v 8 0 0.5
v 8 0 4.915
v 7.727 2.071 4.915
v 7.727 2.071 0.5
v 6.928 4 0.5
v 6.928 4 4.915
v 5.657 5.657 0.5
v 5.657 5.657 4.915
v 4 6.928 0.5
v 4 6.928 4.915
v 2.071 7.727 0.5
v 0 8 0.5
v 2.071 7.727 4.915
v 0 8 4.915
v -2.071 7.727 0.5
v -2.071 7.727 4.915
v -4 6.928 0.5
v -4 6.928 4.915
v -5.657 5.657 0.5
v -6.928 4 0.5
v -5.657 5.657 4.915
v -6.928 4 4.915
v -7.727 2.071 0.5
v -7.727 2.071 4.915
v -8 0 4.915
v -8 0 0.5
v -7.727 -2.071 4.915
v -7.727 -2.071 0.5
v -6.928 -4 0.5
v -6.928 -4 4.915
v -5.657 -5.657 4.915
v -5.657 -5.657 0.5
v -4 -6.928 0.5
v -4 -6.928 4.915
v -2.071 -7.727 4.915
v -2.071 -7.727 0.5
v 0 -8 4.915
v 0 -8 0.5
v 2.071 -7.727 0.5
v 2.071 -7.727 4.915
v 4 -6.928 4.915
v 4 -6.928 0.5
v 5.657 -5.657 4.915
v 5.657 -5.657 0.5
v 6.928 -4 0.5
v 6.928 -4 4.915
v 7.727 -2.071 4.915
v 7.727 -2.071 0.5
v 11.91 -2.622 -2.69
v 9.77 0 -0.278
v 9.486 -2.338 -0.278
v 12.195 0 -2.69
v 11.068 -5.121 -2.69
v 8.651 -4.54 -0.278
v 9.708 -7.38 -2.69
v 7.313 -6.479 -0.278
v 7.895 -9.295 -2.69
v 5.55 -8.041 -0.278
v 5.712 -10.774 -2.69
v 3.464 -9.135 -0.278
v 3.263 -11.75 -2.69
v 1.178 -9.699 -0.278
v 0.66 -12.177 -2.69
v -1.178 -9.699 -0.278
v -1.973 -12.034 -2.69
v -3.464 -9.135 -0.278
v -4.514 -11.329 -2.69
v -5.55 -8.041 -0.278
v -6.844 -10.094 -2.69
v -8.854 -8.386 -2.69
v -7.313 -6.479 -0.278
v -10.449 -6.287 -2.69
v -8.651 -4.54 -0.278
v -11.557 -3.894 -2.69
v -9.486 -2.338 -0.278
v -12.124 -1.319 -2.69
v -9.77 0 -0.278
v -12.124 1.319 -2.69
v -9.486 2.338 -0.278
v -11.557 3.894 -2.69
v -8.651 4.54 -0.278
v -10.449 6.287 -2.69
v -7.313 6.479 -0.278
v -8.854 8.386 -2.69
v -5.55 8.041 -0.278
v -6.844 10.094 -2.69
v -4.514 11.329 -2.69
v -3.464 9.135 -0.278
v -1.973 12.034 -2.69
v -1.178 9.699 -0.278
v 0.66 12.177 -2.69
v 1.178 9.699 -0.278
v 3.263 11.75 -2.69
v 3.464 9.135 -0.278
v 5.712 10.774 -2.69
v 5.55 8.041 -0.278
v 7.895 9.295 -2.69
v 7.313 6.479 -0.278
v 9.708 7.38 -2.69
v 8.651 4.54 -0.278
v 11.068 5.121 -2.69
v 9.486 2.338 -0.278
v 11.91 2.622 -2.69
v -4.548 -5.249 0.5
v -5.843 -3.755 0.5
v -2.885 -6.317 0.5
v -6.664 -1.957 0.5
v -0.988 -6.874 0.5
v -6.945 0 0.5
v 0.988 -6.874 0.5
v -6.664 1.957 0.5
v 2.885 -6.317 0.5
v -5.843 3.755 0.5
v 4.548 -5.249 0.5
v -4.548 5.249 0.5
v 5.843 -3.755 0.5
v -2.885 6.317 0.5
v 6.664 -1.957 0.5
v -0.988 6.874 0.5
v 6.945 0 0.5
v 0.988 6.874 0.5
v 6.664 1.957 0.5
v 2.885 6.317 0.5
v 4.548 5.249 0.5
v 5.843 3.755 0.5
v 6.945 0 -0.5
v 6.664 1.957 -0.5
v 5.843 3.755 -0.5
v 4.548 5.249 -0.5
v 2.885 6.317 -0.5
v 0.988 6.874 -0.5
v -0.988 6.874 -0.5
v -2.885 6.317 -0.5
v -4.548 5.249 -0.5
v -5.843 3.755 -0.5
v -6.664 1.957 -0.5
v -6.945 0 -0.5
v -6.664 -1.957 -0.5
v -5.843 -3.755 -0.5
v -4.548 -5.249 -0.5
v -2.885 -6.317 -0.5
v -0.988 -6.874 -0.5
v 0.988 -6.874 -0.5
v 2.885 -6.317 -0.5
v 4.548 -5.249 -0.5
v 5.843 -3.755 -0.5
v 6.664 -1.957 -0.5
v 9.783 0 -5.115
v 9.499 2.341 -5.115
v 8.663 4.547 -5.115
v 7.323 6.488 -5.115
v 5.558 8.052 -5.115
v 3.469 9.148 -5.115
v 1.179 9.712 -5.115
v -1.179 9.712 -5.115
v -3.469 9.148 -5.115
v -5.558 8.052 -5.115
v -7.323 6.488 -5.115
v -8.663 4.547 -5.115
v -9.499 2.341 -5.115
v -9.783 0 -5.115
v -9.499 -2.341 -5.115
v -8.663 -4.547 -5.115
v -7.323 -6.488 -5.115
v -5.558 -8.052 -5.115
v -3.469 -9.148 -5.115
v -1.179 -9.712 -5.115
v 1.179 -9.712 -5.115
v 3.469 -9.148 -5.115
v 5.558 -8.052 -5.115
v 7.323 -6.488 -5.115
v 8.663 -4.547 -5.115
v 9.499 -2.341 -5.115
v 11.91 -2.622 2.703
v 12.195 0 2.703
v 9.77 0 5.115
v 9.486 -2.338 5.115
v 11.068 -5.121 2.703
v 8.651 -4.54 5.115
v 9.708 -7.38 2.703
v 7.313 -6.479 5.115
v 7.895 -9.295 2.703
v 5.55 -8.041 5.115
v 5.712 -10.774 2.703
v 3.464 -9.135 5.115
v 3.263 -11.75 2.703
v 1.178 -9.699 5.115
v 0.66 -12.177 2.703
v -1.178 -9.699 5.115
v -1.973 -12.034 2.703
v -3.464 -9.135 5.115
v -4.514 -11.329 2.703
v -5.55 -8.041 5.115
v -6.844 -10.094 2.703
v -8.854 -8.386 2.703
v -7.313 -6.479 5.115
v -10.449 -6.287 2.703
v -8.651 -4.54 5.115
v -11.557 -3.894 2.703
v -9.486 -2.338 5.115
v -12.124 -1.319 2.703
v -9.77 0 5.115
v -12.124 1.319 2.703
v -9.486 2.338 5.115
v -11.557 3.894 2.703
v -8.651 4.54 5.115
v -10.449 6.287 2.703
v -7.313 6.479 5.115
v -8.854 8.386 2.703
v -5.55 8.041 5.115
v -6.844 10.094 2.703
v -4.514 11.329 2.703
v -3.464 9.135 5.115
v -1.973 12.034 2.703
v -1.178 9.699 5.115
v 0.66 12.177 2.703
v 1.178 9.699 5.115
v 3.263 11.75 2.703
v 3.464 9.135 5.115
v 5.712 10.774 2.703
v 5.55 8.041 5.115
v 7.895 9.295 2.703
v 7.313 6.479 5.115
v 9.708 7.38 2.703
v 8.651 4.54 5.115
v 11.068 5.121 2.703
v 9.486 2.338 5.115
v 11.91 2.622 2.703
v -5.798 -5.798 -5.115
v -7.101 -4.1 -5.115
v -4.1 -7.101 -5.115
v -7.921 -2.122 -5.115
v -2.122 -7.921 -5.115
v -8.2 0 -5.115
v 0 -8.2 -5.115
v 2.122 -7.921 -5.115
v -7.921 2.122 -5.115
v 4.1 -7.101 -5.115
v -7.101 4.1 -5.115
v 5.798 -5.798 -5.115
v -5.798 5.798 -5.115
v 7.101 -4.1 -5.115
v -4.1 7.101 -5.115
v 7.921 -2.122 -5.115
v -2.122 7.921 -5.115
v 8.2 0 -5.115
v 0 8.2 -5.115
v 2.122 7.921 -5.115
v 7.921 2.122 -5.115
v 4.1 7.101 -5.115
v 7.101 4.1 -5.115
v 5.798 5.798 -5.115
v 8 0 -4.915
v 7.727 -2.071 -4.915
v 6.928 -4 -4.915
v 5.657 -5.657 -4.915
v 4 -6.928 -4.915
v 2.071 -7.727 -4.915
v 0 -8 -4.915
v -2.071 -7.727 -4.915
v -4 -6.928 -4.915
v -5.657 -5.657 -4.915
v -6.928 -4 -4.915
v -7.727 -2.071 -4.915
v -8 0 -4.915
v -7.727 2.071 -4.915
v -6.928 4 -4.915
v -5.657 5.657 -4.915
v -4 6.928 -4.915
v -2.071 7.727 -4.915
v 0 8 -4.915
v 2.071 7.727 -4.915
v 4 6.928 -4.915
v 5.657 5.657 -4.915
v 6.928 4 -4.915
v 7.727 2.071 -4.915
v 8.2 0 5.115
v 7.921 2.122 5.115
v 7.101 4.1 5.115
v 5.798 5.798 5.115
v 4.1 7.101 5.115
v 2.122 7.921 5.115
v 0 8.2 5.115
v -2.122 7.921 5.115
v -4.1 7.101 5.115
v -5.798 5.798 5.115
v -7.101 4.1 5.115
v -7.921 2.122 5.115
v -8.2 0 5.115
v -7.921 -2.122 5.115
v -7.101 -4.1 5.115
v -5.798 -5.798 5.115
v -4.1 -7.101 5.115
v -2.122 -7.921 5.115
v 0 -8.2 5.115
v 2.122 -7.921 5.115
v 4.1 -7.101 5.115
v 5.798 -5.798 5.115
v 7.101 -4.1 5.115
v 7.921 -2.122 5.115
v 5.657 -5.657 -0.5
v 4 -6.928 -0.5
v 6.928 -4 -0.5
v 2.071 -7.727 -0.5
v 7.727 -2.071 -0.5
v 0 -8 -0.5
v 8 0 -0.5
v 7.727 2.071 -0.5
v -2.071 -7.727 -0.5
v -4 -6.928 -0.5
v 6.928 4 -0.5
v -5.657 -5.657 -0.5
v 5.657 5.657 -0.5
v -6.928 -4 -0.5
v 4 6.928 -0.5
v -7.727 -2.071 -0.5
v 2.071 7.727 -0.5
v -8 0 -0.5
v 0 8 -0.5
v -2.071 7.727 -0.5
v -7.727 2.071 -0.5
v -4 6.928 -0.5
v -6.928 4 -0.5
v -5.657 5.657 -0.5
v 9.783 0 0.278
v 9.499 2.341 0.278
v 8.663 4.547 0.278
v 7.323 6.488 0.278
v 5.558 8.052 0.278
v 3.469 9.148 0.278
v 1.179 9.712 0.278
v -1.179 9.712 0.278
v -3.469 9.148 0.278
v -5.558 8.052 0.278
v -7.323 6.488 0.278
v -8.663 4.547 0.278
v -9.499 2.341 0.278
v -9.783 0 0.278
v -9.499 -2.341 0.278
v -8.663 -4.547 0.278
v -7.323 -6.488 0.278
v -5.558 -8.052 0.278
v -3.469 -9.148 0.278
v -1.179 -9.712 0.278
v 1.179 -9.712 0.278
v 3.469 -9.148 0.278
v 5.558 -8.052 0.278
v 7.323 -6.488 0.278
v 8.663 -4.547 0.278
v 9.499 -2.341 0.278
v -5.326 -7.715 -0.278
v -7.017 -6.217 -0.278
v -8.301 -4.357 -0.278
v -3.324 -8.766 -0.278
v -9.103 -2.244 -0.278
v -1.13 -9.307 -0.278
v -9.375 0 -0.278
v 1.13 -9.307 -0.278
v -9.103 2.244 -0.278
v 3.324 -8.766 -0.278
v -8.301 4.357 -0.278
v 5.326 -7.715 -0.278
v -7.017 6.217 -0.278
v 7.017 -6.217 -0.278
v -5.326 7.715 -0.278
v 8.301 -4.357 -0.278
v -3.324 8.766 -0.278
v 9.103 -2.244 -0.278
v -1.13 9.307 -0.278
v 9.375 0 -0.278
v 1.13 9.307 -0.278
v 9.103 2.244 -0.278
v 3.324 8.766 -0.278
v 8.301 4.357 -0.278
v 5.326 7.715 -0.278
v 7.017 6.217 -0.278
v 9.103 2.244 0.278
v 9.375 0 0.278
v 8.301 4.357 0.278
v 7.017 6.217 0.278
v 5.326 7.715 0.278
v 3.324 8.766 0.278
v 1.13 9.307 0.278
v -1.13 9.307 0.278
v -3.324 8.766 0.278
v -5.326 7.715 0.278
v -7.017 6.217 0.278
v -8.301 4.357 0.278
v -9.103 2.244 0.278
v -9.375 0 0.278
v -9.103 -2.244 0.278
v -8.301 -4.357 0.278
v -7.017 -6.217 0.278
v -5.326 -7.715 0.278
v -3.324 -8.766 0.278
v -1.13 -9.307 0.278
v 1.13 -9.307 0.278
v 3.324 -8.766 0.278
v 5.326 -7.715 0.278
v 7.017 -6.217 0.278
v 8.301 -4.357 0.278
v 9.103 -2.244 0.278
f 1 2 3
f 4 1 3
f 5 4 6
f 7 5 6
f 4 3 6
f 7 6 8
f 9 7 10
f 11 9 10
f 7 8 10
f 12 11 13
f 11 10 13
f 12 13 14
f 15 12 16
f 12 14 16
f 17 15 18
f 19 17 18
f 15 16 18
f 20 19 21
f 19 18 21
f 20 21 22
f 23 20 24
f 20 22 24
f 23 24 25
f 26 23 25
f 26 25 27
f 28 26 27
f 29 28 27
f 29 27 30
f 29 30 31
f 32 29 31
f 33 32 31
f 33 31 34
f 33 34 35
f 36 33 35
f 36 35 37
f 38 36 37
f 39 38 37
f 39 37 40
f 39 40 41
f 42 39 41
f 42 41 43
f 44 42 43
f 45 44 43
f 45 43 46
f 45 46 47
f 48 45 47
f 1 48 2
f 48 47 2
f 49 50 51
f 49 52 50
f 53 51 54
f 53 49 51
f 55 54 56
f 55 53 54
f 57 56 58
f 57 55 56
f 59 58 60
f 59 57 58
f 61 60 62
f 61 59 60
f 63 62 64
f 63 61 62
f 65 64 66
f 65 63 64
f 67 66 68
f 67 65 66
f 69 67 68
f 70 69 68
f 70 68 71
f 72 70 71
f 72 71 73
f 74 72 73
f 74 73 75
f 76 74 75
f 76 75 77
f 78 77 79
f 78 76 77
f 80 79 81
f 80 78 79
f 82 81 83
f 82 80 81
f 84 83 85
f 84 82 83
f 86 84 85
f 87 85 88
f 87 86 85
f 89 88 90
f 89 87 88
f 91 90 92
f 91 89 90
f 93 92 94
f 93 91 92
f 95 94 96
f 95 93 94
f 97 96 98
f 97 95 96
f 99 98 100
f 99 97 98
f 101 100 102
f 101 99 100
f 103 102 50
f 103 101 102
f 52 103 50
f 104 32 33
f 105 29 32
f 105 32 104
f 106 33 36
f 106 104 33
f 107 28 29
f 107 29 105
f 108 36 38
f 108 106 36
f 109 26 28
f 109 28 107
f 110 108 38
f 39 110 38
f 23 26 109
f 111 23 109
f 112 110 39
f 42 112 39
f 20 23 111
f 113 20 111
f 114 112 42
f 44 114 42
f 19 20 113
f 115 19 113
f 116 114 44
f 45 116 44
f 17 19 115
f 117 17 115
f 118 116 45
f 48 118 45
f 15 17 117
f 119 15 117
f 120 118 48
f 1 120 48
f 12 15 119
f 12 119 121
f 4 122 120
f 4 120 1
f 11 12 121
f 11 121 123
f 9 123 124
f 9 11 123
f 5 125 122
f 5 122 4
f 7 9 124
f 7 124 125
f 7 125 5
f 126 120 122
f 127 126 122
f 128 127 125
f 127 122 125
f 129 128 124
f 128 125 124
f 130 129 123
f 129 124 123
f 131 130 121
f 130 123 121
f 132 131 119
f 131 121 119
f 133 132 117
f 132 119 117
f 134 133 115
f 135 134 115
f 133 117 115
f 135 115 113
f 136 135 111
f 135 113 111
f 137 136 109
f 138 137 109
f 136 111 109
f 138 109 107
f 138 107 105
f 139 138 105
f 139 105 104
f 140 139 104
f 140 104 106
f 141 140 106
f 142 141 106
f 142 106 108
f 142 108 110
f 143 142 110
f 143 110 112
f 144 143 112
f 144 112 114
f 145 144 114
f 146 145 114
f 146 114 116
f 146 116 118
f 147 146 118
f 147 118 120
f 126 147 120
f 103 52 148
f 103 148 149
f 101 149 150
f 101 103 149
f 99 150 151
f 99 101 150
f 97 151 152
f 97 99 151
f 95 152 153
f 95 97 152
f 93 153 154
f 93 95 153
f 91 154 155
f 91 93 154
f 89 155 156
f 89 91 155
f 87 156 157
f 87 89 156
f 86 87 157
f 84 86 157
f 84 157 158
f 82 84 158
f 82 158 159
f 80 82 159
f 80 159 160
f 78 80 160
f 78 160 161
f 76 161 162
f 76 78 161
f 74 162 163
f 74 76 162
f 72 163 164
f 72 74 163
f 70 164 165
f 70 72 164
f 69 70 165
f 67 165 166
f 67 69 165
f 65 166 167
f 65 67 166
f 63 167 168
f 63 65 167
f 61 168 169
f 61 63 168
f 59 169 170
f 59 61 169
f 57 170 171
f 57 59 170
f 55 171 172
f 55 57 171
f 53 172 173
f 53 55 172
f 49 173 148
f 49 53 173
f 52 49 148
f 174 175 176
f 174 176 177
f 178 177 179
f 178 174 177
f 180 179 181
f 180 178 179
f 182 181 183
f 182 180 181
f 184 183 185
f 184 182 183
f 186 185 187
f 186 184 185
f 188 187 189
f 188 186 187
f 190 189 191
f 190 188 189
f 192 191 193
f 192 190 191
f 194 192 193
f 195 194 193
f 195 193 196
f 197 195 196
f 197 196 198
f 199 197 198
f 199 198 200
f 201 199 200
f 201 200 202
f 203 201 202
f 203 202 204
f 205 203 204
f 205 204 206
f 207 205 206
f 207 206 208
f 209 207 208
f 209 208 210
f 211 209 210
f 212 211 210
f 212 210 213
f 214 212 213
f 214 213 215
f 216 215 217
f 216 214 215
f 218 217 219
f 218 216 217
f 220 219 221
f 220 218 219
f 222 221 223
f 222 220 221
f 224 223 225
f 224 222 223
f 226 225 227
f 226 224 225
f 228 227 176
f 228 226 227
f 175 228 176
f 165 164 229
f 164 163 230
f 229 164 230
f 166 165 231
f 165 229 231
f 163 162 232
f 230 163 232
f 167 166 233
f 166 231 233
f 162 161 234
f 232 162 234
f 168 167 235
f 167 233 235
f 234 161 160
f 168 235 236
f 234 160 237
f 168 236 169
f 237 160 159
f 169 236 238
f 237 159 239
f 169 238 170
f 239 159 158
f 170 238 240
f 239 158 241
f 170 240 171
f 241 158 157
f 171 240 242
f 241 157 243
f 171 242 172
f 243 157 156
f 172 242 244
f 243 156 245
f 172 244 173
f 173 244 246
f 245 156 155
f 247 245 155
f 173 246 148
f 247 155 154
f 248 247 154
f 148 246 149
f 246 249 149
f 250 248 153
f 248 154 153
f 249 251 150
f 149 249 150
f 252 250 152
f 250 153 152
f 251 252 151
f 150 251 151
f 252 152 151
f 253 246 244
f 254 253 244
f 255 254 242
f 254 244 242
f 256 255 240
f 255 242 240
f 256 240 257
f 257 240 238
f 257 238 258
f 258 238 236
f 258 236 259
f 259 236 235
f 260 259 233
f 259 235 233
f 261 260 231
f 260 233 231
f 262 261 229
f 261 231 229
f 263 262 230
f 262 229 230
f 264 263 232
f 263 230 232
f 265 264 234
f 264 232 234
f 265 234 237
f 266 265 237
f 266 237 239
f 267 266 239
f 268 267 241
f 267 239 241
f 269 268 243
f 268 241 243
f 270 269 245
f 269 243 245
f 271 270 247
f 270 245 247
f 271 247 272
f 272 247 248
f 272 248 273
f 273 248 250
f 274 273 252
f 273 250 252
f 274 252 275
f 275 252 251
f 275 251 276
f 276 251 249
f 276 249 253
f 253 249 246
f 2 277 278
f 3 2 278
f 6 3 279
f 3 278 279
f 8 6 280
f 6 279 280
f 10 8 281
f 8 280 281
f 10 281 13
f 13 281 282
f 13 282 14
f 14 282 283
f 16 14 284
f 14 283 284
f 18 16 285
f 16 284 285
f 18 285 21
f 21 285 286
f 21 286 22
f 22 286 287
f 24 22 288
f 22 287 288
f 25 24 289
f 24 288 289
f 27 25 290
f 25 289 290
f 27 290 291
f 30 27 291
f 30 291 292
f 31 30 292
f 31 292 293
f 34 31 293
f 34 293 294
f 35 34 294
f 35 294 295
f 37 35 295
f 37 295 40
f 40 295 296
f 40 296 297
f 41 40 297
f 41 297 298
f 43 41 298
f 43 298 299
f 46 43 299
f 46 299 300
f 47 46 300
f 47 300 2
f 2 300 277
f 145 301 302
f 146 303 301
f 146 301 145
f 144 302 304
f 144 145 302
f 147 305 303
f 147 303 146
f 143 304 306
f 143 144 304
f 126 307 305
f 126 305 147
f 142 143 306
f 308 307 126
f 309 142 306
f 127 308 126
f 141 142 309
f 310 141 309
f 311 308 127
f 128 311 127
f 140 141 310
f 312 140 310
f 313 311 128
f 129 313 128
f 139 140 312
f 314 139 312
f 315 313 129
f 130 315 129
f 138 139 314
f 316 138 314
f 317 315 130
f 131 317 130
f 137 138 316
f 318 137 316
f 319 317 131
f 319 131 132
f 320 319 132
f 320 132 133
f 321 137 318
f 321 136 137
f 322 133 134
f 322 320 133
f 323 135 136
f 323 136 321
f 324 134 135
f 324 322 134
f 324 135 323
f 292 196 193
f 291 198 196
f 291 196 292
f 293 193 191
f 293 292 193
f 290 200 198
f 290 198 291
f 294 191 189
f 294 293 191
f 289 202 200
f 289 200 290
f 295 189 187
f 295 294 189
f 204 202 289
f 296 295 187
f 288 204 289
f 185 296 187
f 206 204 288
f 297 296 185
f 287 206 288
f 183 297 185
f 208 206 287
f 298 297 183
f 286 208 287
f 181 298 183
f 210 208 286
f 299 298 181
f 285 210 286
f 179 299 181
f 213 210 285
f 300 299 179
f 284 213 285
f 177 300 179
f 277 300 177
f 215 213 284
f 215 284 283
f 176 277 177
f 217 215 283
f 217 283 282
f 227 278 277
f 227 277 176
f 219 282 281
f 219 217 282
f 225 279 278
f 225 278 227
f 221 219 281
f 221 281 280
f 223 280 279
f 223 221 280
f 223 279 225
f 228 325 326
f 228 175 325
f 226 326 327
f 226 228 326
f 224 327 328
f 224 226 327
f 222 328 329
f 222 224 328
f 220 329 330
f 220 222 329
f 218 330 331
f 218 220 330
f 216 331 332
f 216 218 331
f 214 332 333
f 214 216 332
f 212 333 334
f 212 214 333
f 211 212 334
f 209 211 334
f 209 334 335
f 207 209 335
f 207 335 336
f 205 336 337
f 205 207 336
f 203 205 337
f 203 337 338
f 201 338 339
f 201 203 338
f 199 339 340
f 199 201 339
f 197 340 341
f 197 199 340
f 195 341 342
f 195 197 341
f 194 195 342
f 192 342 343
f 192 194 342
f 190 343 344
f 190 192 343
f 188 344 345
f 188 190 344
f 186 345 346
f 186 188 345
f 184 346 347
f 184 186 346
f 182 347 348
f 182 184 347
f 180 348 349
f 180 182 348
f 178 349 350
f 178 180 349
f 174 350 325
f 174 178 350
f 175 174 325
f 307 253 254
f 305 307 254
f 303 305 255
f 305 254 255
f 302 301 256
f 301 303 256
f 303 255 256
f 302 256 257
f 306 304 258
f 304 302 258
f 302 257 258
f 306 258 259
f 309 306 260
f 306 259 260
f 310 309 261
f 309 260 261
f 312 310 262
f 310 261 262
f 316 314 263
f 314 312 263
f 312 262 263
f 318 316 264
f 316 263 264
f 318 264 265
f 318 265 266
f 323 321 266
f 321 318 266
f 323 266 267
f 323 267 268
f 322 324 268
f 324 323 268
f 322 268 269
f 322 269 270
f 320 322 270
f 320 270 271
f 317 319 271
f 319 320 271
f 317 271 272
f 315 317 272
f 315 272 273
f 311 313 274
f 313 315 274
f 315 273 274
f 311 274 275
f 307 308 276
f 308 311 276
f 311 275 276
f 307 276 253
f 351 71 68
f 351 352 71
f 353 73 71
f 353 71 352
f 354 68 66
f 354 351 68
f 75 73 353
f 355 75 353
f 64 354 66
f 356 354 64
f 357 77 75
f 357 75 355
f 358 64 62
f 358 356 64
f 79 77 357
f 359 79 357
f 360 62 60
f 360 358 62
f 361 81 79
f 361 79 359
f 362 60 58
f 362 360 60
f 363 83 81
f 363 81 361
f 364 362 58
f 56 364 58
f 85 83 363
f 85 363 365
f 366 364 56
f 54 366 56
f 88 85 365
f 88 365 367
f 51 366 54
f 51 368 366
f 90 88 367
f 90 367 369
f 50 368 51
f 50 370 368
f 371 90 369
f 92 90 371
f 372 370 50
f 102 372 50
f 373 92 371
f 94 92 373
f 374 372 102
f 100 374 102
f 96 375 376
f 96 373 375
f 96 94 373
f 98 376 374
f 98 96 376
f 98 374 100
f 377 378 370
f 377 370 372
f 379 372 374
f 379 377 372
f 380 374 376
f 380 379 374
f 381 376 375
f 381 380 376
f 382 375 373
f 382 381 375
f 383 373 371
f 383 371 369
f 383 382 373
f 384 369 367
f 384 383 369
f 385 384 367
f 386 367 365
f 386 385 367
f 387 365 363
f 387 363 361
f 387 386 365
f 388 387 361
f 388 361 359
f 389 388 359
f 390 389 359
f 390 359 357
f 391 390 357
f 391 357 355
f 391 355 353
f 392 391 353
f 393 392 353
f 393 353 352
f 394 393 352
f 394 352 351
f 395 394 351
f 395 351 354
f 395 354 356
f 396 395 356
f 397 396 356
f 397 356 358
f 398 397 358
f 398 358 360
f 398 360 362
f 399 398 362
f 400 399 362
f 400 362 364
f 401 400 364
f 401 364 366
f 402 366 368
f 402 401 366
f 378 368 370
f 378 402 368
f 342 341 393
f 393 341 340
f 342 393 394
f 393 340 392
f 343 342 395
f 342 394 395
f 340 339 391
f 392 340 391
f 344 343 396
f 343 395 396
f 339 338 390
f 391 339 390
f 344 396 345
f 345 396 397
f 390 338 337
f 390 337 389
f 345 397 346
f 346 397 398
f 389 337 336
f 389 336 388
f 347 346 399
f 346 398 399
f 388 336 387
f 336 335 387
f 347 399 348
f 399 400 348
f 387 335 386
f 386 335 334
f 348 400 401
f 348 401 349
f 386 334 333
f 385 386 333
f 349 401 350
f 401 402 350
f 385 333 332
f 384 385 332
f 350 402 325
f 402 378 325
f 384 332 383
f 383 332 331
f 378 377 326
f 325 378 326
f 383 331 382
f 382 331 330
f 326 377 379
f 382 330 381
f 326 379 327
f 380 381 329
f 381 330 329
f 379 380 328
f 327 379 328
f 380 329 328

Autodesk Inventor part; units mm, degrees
ref_plane "YZ Plane" through (0, 0, 0) normal (1, 0, 0) x (0, 1, 0)
ref_plane "XZ Plane" through (0, 0, 0) normal (0, 1, 0) x (-1, 0, 0)
ref_plane "XY Plane" through (0, 0, 0) normal (0, 0, 1) x (1, 0, 0)
sketch "Skizze1" plane through (0, 0, 0) normal (0, 0, 1) x (1, 0, 0)
  line L0 (-17.073, 0) -> (17.073, 0) projected
  line L1 (0, -17.073) -> (0, 17.073) projected
  circle A0 centre (0, 0) radius 12.195
  dimension "d0" = 24.39
extrude "Extrusion1" add sketch "Skizze1" along normal mid plane 10.23
sketch "Skizze2" plane through (0, 0, 5.115) normal (0, 0, 1) x (1, 0, 0)
  circle A0 centre (0, 0) radius 12.195 projected
  circle A1 centre (0, 0) radius 8
  dimension "d3" = 16
extrude "Extrusion2" cut sketch "Skizze2" against normal blind 4.615 contours A1
chamfer "Fase1" distance 0.2 angle 45 1 edges at (-8, 0, 5.115)
mirror "Spiegeln1" about plane through (0, 0, 0) normal (0, 0, 1) of "Extrusion2"
chamfer "Fase2" distance 0.2 angle 45 1 edges at (-8, 0, -5.115)
sketch "Skizze3" plane through (0, 0, 0.5) normal (0, 0, 1) x (1, 0, 0)
  circle A0 centre (0, 0) radius 8 projected
  circle A1 centre (0, 0) radius 6.945
  dimension "d12" = 13.89
extrude "Extrusion3" cut sketch "Skizze3" against normal blind 1 contours A1
sketch "Skizze4" plane through (0, 0, 0) normal (0, 1, 0) x (-1, 0, 0)
  line L0 (17.073, 0) -> (-17.073, 0) projected
  line L1 (0, -7.161) -> (0, 7.161) projected
  line L2 (-12.195, -5.115) -> (12.195, -5.115) projected
  line L3 (12.195, 5.115) -> (-12.195, 5.115) projected
  line L4 (-12.195, -5.115) -> (-12.195, 5.115) projected
  line L5 (-12.195, -5.115) -> (12.195, -5.115) projected
  line L6 (-9.7834, -5.115) -> (-12.195, -2.69)
  line L7 (-12.195, -2.69) -> (-9.77, -0.2784)
  line L8 (-9.77, -0.2784) -> (-9.375, -0.2784)
  line L9 (-9.375, -0.2784) -> (-9.375, 0.2784)
  line L10 (-9.375, 0.2784) -> (-9.7834, 0.2784)
  line L11 (-9.7834, 0.2784) -> (-12.195, 2.7034)
  line L12 (-12.195, 2.7034) -> (-9.77, 5.115)
  line L13 (12.195, 5.115) -> (-12.195, 5.115) projected
  point P0 (0, 0)
  dimension "d15" = 3.42
  dimension "d17" = 9.375
  dimension "d18" = 9.77
revolve "Umdrehung1" cut sketch "Skizze4" angle 360 about axis through (0, 0, -10) along (0, 0, 1) contours L9 L8 L7 L4 L0 | L0 L4 L11 L10 L9 | L2 L4 L6 | L12 L4 L3
properties part number "Delrin_Dual_V"
